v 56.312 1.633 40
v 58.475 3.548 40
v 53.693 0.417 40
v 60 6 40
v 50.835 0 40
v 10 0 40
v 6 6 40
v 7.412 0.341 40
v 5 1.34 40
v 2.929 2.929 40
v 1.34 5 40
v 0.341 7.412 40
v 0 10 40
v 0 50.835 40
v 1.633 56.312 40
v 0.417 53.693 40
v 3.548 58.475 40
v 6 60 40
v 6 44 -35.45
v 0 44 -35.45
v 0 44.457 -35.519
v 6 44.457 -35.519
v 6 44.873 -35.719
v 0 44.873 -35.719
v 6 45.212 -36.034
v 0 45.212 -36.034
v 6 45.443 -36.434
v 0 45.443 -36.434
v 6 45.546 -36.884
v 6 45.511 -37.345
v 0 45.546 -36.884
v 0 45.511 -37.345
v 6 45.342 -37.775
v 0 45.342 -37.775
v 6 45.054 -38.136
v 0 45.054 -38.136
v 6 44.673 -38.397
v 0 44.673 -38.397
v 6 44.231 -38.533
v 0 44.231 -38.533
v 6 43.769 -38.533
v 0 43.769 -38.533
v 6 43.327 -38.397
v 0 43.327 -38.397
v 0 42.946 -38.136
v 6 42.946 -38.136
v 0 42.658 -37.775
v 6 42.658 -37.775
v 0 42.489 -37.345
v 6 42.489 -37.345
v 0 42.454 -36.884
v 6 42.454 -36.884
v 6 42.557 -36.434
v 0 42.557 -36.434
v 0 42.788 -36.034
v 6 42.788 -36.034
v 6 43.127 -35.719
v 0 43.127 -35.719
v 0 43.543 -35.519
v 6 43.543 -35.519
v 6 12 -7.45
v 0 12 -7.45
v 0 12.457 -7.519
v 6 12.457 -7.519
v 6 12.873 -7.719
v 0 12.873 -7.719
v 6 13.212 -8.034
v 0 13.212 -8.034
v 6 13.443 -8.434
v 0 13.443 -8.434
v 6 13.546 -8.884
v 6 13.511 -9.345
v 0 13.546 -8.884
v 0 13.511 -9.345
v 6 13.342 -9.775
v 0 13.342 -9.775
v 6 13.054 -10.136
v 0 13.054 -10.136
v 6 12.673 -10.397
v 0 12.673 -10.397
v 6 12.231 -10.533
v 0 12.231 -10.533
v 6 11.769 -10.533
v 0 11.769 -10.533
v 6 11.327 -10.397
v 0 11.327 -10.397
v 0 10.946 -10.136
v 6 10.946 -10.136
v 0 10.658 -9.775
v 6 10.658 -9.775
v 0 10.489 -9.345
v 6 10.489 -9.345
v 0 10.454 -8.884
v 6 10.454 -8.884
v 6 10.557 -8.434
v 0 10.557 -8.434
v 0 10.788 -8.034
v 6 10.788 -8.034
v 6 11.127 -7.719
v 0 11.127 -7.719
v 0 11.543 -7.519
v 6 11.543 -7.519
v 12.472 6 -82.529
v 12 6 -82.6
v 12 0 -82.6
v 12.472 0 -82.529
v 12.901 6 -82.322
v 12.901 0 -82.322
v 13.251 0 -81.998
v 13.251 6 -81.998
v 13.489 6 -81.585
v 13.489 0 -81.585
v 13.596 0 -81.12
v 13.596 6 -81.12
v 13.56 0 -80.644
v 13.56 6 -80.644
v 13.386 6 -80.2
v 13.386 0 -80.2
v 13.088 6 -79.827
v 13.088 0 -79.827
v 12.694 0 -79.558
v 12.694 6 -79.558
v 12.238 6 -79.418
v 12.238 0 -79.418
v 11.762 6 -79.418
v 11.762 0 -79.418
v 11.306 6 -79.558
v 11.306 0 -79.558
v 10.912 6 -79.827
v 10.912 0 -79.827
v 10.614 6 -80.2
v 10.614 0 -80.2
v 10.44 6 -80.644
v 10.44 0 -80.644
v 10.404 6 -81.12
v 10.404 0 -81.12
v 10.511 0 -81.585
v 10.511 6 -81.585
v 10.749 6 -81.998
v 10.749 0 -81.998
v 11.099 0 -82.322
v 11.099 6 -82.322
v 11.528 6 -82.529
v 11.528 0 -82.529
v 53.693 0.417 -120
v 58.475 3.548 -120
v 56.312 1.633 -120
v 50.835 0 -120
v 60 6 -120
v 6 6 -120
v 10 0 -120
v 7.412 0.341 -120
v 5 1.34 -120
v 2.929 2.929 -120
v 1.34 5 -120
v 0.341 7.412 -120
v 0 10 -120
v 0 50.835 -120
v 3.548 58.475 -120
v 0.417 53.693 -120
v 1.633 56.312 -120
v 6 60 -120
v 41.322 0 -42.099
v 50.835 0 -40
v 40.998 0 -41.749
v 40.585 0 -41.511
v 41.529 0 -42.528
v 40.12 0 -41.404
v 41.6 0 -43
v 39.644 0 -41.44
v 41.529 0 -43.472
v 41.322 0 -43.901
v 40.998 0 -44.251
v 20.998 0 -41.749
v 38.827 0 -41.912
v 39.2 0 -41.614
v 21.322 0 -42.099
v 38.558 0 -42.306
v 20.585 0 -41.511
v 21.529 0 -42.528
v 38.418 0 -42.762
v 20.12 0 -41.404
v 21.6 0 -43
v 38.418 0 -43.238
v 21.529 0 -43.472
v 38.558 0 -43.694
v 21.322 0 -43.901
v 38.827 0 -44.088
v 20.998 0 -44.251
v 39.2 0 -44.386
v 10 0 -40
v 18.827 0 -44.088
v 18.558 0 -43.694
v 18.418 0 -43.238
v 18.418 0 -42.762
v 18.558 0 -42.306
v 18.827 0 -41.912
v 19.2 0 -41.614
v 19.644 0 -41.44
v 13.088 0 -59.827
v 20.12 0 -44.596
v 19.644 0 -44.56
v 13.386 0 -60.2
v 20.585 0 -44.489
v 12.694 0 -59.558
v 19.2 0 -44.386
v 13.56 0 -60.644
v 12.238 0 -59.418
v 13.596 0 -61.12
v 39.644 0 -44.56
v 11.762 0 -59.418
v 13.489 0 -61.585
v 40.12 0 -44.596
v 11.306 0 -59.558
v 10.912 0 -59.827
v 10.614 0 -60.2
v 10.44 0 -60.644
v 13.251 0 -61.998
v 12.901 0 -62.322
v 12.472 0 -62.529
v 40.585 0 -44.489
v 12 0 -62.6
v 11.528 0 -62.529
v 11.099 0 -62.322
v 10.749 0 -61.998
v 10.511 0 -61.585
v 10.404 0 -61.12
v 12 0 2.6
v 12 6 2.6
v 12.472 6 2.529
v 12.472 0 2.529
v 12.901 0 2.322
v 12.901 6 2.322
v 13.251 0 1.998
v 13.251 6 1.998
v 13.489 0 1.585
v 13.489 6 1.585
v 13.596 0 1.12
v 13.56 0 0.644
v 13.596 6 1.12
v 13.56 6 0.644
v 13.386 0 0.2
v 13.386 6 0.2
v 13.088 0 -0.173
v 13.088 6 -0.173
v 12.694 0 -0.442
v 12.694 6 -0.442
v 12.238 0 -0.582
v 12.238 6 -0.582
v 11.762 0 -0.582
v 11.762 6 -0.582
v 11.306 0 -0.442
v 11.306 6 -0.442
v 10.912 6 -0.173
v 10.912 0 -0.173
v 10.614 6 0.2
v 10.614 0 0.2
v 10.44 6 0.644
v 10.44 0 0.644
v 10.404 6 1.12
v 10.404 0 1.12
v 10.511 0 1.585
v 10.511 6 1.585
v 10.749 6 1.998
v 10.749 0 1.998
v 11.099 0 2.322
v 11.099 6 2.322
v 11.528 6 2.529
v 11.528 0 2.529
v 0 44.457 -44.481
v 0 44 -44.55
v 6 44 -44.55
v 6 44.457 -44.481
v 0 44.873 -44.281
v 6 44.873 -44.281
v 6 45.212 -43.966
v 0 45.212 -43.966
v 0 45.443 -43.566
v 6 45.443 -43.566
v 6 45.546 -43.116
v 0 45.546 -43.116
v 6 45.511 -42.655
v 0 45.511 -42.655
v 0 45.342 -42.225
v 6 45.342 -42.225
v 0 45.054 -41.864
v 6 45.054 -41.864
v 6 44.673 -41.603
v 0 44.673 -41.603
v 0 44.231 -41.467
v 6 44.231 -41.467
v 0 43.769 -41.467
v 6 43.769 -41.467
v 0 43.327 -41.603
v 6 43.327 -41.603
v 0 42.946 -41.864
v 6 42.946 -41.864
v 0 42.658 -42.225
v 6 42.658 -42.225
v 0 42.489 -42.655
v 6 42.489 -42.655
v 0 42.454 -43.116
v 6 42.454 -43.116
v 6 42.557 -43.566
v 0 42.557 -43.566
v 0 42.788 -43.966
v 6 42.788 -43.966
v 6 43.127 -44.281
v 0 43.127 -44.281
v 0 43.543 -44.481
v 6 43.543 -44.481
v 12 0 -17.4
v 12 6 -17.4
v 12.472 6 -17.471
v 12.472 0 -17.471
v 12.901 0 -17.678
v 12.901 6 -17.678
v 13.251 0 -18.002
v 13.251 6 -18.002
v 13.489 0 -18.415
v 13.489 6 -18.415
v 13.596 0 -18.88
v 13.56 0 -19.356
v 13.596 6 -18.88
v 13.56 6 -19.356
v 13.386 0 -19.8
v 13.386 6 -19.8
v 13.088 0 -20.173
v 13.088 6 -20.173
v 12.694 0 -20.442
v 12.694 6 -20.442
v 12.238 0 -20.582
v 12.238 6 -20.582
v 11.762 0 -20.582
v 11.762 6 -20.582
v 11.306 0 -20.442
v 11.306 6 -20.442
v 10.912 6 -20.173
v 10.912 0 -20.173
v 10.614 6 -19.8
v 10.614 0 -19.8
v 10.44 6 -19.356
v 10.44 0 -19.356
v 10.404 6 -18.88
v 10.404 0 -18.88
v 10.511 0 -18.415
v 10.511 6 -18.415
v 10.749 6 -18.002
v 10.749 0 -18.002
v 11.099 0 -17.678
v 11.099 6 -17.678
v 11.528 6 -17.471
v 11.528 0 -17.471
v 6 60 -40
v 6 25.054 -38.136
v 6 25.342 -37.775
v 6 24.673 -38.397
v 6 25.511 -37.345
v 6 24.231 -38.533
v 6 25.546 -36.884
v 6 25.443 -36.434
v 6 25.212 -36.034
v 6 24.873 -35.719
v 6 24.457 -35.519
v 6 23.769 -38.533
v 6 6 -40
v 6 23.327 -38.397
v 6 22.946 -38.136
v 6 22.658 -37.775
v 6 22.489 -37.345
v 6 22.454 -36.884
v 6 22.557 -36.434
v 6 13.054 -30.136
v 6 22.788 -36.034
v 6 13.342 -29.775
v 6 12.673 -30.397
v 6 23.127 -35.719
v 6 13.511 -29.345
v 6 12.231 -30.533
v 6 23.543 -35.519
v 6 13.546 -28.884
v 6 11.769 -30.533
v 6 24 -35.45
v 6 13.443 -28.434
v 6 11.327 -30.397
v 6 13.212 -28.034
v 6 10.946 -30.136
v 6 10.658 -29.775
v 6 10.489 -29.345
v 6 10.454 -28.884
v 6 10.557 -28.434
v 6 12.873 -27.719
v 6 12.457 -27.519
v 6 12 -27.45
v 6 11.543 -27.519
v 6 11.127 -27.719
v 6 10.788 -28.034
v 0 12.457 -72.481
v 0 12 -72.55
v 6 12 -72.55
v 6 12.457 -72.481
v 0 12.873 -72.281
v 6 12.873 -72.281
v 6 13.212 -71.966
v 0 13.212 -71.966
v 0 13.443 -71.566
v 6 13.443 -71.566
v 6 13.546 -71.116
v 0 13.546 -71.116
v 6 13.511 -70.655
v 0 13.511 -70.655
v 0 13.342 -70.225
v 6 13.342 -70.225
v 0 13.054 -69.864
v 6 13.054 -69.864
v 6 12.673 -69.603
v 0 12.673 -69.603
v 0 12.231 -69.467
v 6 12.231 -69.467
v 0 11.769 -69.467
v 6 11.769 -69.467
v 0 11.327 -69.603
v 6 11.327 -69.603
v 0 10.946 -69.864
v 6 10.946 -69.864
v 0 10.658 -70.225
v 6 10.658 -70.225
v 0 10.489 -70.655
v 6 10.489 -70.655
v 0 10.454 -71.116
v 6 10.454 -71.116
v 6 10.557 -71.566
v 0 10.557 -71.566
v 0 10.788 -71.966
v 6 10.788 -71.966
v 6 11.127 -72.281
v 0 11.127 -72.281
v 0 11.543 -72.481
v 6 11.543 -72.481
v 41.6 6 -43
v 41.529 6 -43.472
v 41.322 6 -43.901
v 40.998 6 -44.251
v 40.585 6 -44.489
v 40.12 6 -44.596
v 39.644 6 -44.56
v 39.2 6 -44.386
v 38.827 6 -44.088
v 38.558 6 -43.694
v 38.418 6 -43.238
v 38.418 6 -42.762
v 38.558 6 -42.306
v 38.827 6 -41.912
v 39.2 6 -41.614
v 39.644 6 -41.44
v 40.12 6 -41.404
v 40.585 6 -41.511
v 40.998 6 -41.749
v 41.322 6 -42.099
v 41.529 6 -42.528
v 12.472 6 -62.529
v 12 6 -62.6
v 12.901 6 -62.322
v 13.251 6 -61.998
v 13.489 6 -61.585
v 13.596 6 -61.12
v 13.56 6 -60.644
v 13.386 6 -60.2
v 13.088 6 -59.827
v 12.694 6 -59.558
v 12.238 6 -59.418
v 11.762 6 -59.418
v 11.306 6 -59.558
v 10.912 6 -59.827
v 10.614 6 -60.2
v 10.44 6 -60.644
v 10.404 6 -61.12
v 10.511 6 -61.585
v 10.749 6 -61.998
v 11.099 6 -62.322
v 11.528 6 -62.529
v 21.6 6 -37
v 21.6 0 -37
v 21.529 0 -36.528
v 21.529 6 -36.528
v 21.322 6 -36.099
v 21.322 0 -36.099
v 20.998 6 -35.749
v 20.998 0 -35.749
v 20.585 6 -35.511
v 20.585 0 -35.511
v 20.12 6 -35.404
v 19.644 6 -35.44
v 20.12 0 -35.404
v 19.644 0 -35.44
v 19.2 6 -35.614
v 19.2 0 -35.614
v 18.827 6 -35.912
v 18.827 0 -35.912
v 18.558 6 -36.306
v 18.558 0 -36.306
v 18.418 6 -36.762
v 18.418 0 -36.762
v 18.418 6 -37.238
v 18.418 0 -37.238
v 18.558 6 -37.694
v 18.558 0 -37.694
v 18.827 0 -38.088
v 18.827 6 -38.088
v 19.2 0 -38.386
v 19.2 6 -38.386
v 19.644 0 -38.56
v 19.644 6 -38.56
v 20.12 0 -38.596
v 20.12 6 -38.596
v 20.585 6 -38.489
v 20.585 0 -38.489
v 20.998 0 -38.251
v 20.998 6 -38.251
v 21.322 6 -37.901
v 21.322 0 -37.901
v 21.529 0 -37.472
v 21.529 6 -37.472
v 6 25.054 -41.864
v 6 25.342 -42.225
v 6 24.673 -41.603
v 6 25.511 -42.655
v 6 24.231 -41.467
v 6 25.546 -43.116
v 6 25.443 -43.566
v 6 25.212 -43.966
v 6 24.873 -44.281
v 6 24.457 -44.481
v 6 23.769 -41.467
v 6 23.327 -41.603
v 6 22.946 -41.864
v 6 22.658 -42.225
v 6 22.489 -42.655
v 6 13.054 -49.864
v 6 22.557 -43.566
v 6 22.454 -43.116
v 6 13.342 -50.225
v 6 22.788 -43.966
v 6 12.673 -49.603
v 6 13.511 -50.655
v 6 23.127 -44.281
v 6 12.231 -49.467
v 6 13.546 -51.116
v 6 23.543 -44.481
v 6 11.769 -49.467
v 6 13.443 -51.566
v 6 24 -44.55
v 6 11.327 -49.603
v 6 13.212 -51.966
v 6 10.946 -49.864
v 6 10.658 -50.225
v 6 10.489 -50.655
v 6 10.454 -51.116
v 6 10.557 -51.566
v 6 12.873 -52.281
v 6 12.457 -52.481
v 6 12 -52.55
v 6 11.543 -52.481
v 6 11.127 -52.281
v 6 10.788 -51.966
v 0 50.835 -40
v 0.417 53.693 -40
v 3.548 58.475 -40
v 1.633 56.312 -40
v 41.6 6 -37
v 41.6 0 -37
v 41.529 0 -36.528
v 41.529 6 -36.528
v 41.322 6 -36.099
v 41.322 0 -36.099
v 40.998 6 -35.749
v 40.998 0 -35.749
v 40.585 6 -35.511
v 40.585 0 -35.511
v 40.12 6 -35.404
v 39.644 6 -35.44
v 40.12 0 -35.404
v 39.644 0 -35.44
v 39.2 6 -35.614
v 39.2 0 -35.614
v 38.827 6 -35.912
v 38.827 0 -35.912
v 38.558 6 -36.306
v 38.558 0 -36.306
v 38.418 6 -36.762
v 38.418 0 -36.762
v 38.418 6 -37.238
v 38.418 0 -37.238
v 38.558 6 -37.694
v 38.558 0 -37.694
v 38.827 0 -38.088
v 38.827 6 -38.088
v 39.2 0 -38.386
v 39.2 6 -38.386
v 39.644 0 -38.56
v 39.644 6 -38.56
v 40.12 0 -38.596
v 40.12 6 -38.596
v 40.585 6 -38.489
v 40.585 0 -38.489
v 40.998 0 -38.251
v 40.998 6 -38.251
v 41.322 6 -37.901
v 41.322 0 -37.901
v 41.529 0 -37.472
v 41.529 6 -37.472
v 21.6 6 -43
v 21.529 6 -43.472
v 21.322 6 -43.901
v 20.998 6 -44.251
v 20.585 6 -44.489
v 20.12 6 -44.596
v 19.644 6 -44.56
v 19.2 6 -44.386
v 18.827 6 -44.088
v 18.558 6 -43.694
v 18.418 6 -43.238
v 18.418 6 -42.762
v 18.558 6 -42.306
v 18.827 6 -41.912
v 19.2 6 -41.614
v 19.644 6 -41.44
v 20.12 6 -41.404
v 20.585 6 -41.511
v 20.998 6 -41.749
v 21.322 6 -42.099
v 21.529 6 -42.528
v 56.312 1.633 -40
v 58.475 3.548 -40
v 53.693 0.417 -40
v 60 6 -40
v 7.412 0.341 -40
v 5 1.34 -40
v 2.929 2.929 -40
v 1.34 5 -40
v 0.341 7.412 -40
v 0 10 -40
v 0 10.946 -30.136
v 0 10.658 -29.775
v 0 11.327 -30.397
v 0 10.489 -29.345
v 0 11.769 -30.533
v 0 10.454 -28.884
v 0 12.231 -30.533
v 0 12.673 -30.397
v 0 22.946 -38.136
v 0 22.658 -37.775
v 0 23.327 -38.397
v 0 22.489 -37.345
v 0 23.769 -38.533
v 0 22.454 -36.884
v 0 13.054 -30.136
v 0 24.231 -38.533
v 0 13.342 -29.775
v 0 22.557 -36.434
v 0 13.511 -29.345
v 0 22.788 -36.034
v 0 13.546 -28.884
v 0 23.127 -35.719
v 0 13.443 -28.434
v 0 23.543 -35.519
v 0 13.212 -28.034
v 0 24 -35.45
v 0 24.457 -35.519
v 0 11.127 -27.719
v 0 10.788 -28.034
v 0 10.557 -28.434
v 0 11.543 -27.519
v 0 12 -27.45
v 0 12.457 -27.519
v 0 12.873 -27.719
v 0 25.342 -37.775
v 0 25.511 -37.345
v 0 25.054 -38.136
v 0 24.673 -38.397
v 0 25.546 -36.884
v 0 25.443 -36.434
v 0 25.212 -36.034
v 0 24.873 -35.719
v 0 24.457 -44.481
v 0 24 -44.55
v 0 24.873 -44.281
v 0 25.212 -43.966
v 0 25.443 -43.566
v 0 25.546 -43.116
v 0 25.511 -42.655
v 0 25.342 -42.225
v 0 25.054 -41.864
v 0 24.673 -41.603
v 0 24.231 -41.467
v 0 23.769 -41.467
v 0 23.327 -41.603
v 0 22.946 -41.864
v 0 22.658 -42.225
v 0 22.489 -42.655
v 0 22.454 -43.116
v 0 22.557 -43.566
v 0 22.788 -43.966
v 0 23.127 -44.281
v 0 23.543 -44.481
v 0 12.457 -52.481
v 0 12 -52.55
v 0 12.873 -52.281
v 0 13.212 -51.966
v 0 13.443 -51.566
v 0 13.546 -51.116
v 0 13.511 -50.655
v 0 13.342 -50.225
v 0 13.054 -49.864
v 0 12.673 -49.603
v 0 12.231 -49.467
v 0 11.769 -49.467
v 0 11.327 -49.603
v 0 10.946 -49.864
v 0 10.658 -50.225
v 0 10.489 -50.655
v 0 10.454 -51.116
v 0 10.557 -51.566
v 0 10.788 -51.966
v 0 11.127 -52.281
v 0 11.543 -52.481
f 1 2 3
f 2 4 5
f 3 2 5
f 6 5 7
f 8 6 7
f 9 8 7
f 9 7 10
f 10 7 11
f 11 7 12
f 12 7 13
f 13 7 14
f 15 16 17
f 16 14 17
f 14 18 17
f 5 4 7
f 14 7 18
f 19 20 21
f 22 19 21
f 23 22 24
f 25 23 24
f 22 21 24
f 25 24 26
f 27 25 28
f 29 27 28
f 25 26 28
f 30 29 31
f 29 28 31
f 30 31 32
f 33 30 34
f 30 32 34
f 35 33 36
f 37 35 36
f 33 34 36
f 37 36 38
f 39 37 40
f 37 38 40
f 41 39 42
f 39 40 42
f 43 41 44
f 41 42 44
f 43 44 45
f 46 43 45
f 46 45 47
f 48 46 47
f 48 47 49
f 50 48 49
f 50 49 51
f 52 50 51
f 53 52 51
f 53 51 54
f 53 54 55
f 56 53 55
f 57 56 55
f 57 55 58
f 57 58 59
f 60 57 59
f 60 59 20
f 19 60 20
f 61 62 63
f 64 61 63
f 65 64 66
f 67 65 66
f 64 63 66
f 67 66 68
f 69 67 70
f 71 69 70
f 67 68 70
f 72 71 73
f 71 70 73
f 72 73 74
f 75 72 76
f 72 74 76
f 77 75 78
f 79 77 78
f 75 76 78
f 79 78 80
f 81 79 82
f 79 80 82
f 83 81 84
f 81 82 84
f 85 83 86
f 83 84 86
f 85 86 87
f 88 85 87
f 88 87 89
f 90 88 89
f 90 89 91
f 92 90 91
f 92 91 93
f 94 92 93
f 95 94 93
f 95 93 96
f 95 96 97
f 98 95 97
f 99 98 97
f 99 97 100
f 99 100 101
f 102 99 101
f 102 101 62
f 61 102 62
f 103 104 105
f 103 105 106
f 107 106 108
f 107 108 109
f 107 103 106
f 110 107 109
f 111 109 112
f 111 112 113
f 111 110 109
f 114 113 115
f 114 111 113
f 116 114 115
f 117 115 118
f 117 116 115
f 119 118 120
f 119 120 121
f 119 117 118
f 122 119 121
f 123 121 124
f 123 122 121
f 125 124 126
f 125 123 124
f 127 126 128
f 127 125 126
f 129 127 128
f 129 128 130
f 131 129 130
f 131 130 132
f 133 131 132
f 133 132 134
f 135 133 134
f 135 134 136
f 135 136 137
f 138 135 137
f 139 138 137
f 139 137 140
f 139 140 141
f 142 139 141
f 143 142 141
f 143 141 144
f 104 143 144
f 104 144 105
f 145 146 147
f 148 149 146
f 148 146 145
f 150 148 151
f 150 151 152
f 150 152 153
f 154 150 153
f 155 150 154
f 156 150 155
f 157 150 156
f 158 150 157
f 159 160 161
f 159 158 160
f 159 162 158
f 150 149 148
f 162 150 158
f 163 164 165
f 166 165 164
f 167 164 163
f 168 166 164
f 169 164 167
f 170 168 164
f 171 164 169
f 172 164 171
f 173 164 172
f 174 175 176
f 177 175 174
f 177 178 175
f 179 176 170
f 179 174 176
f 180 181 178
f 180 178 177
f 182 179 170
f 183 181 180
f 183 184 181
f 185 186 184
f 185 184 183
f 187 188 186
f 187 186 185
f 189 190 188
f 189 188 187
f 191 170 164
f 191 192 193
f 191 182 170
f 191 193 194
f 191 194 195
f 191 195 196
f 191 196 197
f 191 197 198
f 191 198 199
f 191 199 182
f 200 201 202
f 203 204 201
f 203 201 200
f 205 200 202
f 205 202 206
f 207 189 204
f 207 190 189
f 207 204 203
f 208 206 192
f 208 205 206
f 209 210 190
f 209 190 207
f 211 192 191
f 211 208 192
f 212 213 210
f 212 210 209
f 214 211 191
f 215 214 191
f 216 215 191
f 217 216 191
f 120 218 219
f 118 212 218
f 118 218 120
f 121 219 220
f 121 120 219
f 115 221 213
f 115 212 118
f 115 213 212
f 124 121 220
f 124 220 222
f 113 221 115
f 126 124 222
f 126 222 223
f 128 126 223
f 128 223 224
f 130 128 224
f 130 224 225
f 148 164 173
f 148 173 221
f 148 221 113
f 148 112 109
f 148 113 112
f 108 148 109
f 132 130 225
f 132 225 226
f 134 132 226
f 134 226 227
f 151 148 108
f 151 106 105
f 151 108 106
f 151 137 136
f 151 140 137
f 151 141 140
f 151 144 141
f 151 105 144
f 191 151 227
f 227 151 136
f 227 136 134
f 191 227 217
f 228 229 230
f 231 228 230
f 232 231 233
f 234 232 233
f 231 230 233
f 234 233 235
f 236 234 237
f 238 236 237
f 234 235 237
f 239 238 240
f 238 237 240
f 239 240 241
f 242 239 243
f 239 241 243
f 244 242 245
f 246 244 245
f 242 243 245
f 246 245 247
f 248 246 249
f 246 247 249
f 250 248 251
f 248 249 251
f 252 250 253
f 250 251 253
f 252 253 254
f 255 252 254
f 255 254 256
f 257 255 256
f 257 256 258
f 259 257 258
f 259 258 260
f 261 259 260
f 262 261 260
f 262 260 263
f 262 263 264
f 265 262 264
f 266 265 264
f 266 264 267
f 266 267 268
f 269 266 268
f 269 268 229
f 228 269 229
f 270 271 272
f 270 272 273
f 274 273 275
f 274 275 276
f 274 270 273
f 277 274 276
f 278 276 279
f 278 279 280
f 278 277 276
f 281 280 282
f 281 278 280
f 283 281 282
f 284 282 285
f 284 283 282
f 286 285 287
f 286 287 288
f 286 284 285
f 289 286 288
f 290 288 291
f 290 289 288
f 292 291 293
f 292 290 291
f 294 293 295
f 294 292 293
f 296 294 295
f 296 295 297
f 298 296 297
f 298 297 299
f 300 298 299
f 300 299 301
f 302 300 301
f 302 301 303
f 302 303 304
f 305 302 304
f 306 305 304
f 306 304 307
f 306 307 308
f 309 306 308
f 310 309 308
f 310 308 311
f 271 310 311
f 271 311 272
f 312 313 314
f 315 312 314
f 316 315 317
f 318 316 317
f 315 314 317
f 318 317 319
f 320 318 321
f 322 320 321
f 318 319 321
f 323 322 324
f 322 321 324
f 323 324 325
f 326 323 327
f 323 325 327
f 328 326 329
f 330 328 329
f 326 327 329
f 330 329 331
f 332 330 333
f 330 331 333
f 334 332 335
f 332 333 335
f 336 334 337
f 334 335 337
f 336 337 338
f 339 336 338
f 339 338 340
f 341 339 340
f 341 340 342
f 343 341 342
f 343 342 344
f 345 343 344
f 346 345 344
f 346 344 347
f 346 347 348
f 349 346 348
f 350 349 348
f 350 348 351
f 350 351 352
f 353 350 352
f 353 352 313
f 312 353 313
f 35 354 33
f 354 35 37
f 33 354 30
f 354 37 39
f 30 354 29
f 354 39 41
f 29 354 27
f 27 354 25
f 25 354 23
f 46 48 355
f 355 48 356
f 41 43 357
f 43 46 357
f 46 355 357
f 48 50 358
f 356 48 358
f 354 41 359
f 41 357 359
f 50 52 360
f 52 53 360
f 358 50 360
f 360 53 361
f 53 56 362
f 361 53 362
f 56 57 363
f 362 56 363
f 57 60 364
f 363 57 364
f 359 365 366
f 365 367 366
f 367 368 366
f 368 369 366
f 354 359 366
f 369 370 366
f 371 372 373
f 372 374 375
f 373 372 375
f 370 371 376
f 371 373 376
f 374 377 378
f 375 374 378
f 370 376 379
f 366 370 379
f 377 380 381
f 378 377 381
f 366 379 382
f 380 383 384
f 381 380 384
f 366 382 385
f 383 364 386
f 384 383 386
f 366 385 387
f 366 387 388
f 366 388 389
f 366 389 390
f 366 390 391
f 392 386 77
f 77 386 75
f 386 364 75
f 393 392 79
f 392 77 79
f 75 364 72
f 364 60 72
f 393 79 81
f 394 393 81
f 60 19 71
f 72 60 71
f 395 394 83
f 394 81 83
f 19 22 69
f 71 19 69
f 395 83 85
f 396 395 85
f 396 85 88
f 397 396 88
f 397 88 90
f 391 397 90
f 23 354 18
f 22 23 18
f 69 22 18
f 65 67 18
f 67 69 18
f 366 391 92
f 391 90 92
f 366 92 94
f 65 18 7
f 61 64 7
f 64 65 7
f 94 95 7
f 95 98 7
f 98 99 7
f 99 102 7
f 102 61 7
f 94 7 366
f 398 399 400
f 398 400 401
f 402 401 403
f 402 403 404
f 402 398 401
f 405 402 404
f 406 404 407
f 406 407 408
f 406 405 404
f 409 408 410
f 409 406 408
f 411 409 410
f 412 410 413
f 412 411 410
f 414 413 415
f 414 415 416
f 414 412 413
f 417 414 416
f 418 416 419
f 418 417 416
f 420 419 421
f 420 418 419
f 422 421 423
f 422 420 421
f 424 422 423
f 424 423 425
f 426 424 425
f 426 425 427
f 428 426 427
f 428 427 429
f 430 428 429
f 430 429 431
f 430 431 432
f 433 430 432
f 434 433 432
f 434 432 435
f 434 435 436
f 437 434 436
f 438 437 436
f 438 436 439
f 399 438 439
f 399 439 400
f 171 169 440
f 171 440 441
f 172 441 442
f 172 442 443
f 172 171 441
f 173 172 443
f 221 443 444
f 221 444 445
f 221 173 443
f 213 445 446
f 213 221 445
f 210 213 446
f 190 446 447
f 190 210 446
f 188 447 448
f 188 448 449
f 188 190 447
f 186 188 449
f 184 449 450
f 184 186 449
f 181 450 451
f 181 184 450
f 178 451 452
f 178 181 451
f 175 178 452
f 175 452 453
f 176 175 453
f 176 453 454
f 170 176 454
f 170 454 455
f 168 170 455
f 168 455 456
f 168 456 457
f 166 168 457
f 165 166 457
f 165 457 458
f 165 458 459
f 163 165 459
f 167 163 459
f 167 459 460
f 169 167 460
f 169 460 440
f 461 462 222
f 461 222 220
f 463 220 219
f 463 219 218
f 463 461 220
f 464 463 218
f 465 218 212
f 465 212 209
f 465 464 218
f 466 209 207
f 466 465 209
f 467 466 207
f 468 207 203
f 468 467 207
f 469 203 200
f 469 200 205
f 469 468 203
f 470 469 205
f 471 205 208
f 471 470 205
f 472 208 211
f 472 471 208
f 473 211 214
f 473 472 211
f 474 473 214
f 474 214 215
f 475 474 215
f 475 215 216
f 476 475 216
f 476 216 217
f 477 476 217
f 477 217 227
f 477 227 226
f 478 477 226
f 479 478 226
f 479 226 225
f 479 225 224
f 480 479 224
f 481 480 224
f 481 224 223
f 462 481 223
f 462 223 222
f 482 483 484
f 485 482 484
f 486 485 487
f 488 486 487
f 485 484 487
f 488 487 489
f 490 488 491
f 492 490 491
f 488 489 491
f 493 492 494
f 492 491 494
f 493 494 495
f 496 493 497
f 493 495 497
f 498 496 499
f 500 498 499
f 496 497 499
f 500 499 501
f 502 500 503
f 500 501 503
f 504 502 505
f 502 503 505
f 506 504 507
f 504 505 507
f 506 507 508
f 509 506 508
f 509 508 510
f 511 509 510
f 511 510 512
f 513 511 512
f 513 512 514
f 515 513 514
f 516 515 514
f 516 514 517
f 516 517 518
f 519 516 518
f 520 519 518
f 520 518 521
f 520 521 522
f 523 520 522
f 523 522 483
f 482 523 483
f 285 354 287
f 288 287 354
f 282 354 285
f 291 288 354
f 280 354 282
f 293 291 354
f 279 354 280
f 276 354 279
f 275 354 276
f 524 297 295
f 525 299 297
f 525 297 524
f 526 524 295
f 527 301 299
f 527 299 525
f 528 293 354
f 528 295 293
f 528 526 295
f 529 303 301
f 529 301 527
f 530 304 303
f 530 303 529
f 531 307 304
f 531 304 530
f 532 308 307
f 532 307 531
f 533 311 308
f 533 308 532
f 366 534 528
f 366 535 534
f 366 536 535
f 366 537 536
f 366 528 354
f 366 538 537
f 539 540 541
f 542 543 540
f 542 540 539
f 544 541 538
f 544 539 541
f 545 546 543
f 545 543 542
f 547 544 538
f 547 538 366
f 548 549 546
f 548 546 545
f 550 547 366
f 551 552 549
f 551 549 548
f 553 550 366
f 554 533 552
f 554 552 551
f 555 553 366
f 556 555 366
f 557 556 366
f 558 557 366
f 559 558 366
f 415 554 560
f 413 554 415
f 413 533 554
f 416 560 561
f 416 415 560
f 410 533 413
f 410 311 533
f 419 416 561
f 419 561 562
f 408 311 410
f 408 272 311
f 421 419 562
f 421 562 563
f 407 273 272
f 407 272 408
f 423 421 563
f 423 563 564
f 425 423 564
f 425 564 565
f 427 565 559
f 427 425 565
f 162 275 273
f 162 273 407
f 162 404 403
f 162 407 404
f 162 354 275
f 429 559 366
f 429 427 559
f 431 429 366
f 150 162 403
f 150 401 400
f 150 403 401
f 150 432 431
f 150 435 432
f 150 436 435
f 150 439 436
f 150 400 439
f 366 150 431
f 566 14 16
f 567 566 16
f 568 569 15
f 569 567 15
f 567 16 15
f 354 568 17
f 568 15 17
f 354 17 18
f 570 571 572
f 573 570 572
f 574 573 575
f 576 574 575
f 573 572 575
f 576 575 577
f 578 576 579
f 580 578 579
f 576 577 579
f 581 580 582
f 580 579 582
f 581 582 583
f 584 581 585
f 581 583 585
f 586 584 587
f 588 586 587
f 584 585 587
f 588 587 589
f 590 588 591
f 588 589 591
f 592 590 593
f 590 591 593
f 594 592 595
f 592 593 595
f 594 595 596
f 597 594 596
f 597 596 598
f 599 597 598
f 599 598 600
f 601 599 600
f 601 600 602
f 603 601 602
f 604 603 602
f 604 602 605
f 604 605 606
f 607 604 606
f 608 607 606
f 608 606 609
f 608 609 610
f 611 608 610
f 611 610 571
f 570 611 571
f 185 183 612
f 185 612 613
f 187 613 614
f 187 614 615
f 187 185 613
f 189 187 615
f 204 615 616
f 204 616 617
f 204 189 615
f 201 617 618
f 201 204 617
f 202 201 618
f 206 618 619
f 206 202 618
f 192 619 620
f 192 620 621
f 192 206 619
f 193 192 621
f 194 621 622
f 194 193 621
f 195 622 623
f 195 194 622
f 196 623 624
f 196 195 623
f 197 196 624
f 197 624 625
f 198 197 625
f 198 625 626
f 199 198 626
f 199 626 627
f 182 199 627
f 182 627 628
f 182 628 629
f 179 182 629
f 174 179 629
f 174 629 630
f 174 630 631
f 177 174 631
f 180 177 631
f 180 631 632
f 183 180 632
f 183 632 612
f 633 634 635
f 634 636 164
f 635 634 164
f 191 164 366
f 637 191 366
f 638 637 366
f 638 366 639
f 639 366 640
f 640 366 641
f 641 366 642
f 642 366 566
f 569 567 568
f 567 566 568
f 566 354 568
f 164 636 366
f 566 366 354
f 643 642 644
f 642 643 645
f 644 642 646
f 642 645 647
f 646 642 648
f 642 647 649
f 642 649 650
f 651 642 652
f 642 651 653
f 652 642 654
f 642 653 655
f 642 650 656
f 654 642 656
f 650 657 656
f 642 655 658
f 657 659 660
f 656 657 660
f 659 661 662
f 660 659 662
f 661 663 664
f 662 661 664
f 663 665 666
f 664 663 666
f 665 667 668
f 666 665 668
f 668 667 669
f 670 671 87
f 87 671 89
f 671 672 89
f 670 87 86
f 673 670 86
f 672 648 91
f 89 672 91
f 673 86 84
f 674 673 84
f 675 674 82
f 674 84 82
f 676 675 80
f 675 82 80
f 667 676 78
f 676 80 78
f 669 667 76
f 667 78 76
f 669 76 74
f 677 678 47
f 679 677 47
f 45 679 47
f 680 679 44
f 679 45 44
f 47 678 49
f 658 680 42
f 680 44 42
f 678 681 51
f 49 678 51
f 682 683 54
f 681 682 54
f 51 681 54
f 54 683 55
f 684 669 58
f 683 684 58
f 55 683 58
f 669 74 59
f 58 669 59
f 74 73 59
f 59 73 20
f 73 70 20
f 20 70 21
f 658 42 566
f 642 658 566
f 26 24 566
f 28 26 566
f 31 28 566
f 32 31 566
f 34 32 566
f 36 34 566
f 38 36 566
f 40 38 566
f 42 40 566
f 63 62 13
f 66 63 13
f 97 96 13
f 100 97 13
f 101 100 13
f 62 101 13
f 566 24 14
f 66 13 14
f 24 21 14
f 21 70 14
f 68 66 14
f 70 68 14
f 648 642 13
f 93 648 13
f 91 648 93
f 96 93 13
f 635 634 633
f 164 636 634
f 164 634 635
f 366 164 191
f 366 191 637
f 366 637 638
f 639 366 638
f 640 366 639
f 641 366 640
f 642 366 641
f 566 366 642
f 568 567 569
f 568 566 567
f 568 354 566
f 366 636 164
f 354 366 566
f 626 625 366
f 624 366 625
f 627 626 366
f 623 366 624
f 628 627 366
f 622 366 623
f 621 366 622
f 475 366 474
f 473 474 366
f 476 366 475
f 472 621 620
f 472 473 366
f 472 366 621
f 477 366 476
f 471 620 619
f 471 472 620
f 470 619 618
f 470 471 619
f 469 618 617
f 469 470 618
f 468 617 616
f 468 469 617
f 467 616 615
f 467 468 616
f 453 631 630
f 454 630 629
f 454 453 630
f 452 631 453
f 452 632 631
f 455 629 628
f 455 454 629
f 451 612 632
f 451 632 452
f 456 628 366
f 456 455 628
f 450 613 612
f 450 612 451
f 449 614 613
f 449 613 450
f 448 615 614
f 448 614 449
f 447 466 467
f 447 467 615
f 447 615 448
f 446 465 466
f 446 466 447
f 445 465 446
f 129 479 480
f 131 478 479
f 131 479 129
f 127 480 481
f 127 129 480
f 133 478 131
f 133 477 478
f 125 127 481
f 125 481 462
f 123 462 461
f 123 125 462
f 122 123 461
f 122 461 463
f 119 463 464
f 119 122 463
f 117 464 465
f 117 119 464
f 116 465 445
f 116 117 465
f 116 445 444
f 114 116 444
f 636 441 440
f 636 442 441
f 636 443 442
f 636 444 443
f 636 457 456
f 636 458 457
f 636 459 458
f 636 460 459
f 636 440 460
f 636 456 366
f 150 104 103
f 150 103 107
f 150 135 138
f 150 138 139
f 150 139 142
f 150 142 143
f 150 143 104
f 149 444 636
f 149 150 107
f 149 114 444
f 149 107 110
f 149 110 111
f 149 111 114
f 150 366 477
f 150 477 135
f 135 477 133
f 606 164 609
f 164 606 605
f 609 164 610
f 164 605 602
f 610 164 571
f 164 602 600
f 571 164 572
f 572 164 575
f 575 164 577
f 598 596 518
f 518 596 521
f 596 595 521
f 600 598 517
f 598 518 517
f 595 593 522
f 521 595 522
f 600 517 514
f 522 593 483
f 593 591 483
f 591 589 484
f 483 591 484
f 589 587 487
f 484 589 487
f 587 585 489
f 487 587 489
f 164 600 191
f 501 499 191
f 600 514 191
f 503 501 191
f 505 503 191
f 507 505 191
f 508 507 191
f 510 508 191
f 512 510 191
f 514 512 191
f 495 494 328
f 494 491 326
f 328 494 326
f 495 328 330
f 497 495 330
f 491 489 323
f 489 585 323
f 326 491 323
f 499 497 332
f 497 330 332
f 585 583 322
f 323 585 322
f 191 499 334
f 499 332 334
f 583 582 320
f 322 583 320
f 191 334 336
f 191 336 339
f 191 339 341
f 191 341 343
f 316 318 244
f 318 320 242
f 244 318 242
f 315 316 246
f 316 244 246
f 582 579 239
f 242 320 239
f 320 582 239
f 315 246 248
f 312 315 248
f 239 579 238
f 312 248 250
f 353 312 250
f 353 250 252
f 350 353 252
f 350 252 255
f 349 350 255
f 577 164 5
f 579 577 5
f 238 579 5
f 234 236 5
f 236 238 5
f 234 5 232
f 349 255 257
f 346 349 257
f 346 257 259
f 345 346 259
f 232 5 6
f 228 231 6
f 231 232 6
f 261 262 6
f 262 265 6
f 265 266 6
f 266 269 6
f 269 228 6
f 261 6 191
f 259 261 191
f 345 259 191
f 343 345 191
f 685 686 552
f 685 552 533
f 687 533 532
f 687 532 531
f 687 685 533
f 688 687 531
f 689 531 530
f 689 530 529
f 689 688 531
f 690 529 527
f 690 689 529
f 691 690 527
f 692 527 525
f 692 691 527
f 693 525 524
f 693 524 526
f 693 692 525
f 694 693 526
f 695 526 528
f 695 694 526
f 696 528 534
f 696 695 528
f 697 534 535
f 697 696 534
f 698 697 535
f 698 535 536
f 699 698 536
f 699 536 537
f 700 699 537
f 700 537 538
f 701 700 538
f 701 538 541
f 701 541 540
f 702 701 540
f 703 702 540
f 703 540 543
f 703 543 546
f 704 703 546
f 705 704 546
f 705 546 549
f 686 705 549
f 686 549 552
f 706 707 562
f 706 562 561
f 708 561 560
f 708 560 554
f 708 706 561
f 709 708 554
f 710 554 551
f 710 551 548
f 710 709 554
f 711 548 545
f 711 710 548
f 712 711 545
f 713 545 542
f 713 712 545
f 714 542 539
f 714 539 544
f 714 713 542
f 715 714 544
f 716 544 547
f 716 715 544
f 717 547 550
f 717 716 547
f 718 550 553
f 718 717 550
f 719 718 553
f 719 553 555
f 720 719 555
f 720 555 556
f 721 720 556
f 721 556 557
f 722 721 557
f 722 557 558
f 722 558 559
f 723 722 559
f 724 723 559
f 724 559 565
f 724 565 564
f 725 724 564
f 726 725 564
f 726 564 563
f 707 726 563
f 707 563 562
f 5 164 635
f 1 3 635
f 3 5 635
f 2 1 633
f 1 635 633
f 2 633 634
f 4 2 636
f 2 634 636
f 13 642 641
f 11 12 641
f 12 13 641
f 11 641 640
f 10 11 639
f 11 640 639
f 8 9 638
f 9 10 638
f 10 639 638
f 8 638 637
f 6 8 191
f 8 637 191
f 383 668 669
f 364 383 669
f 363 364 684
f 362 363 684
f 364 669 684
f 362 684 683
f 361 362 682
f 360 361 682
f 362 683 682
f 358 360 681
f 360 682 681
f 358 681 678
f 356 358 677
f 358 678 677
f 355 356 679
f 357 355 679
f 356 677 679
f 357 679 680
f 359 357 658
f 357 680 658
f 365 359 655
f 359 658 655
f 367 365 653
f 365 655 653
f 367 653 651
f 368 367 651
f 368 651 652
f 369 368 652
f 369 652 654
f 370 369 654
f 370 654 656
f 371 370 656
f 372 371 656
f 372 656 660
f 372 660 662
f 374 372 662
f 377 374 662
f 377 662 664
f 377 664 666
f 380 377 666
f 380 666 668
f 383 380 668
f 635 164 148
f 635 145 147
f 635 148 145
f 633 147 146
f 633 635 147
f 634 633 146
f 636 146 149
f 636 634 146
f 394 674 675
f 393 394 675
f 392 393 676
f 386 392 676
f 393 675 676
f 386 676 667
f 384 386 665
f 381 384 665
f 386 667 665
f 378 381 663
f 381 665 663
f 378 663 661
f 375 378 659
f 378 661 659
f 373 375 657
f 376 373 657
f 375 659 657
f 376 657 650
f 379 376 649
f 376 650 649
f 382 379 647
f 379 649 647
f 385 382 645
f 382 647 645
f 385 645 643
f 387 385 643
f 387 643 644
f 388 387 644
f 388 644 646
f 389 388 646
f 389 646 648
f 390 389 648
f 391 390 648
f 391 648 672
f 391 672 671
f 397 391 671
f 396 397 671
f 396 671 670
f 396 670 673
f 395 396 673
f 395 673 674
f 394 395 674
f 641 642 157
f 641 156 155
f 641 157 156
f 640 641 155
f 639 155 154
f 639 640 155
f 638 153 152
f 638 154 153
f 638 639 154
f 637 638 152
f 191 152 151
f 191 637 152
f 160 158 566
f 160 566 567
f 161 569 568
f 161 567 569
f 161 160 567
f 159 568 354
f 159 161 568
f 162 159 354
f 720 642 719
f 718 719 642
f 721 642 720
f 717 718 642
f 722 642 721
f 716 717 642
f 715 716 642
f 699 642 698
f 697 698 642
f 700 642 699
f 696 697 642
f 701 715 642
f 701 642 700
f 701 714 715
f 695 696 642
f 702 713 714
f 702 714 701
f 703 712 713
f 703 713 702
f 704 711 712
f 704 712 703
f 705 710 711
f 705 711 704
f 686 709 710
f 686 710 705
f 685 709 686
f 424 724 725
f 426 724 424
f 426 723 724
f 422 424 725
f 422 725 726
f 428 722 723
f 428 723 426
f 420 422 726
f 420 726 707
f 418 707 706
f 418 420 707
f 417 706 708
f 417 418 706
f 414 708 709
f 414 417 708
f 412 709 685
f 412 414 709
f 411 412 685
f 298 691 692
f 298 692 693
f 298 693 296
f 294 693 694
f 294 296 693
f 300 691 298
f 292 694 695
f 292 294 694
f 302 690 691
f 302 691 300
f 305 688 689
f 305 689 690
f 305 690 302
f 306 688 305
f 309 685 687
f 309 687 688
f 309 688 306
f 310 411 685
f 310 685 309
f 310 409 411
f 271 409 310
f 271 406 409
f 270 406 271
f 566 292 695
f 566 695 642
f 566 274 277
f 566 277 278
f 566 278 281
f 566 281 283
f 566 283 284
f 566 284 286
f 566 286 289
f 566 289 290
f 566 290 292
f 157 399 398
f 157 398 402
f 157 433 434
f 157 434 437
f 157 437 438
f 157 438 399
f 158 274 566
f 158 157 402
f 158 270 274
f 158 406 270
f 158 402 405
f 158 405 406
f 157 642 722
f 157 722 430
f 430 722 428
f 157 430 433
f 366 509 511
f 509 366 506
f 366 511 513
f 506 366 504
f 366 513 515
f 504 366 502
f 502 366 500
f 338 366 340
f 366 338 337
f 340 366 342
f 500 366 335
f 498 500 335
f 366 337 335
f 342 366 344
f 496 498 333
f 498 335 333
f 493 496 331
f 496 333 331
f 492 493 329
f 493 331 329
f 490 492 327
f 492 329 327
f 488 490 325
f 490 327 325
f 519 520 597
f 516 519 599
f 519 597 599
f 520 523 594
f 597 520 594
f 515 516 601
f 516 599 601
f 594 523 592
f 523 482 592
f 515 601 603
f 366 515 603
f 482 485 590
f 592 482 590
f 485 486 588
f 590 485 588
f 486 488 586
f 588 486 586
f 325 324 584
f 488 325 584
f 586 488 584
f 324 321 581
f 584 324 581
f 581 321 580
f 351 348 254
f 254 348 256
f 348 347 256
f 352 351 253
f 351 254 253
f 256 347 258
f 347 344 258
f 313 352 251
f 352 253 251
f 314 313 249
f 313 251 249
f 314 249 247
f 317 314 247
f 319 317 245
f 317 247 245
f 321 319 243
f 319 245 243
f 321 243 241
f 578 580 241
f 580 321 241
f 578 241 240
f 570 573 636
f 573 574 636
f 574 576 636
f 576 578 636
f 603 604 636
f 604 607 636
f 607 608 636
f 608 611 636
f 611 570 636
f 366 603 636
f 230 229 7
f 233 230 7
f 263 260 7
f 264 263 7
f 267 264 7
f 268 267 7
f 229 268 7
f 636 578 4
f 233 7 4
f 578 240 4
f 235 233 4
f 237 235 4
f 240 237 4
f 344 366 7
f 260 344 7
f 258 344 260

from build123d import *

# Parameters (mm, degrees)
EXTRUDE_1_DEPTH     = 40
FILLET_1_R          = 10
SKETCH_3_R          = 1.55
CUT_EXTRUDE_1_DEPTH = 94.808315196
SKETCH_4_R          = 1.6
CUT_EXTRUDE_2_DEPTH = 91.088845036
SKETCH_5_R          = 1.6
CUT_EXTRUDE_3_DEPTH = 94.808315196


with BuildPart() as part:
    # 草图1 → 凸台-拉伸1 (new, symmetric)
    with BuildSketch(Plane.XY):
        Polygon((0, 0), (0, 60), (6, 60), (6, 6), (60, 6), (60, 0), align=None)
    extrude(amount=EXTRUDE_1_DEPTH, both=True)

    # 圆角1
    # the kernel refuses this fillet: 10 mm, written as the material it takes off along each edge
    with BuildSketch(Plane(origin=(0, 60, 62.912878475), x_dir=(0, -1, 0), z_dir=(0, 0, -1))) as fillet_1_piece_1:
        with BuildLine():
            CenterArc((9.16515139, -10), FILLET_1_R, 90, 66.421821522)
            Line((0, -6), (-0.183303028, -5.92))
            ThreePointArc((-0.183303028, -5.92), (-0.2, -3), (-0.2, 0))
            Line((-0.2, 0), (0, 0.2))
            Line((0, 0.2), (9.16515139, 0.2))
            Line((9.16515139, 0.2), (9.16515139, 0))
        make_face()
    extrude(amount=125.82575695, mode=Mode.SUBTRACT)
    with BuildSketch(Plane(origin=(60, 0, -62.912878475), x_dir=(0, 1, 0), z_dir=(0, 0, 1))) as fillet_1_piece_2:
        with BuildLine():
            CenterArc((10, 9.16515139), FILLET_1_R, 180, 66.421821522)
            Line((0, 9.16515139), (-0.2, 9.16515139))
            Line((-0.2, 9.16515139), (-0.2, 0))
            Line((-0.2, 0), (0, -0.2))
            ThreePointArc((0, -0.2), (3, -0.2), (5.92, -0.183303028))
            Line((5.92, -0.183303028), (6, 0))
        make_face()
    extrude(amount=125.82575695, mode=Mode.SUBTRACT)
    with BuildSketch(Plane(origin=(0, 0, -65), x_dir=(0, 1, 0), z_dir=(0, 0, 1))) as fillet_1_piece_3:
        with BuildLine():
            CenterArc((FILLET_1_R, -FILLET_1_R), FILLET_1_R, 90, 90)
            Line((0, -FILLET_1_R), (-FILLET_1_R * 0.02, -FILLET_1_R))
            Line((-FILLET_1_R * 0.02, -FILLET_1_R), (-FILLET_1_R * 0.02, FILLET_1_R * 0.02))
            Line((-FILLET_1_R * 0.02, FILLET_1_R * 0.02), (FILLET_1_R, FILLET_1_R * 0.02))
            Line((FILLET_1_R, FILLET_1_R * 0.02), (FILLET_1_R, 0))
        make_face()
    extrude(amount=130, mode=Mode.SUBTRACT)

    # 草图3 → 切除-拉伸1 (cut, through all)
    with BuildSketch(Plane.ZY):
        with Locations((-37, 44)):
            Circle(SKETCH_3_R)
        with Locations((-37, 24)):
            Circle(SKETCH_3_R)
        with Locations((-29, 12)):
            Circle(SKETCH_3_R)
        with Locations((-9, 12)):
            Circle(SKETCH_3_R)
    extrude(amount=-CUT_EXTRUDE_1_DEPTH, mode=Mode.SUBTRACT)

    # 草图4 → 切除-拉伸2 (cut, through all)
    with BuildSketch(Plane(origin=(0, 6, 0), x_dir=(1, 0, 0), z_dir=(0, 1, 0))):
        with Locations(Location((12, -1, 0), (0, 0, 270))):
            Circle(SKETCH_4_R)
        with Locations(Location((12, 19, 0), (0, 0, 270))):
            Circle(SKETCH_4_R)
    extrude(amount=-CUT_EXTRUDE_2_DEPTH, mode=Mode.SUBTRACT)

    # 草图5 → 切除-拉伸3 (cut, through all)
    with BuildSketch(Plane.XZ):
        with Locations((20, -37)):
            Circle(SKETCH_5_R)
        with Locations((40, -37)):
            Circle(SKETCH_5_R)
    extrude(amount=-CUT_EXTRUDE_3_DEPTH, mode=Mode.SUBTRACT)


with BuildPart() as body_2:
    # 镜向1: mirrored copy
    add(part.part.mirror(Plane(origin=(0, 0, -40), x_dir=(1, 0, 0), z_dir=(0, 0, -1))))


solid = Compound([part.part, body_2.part])
